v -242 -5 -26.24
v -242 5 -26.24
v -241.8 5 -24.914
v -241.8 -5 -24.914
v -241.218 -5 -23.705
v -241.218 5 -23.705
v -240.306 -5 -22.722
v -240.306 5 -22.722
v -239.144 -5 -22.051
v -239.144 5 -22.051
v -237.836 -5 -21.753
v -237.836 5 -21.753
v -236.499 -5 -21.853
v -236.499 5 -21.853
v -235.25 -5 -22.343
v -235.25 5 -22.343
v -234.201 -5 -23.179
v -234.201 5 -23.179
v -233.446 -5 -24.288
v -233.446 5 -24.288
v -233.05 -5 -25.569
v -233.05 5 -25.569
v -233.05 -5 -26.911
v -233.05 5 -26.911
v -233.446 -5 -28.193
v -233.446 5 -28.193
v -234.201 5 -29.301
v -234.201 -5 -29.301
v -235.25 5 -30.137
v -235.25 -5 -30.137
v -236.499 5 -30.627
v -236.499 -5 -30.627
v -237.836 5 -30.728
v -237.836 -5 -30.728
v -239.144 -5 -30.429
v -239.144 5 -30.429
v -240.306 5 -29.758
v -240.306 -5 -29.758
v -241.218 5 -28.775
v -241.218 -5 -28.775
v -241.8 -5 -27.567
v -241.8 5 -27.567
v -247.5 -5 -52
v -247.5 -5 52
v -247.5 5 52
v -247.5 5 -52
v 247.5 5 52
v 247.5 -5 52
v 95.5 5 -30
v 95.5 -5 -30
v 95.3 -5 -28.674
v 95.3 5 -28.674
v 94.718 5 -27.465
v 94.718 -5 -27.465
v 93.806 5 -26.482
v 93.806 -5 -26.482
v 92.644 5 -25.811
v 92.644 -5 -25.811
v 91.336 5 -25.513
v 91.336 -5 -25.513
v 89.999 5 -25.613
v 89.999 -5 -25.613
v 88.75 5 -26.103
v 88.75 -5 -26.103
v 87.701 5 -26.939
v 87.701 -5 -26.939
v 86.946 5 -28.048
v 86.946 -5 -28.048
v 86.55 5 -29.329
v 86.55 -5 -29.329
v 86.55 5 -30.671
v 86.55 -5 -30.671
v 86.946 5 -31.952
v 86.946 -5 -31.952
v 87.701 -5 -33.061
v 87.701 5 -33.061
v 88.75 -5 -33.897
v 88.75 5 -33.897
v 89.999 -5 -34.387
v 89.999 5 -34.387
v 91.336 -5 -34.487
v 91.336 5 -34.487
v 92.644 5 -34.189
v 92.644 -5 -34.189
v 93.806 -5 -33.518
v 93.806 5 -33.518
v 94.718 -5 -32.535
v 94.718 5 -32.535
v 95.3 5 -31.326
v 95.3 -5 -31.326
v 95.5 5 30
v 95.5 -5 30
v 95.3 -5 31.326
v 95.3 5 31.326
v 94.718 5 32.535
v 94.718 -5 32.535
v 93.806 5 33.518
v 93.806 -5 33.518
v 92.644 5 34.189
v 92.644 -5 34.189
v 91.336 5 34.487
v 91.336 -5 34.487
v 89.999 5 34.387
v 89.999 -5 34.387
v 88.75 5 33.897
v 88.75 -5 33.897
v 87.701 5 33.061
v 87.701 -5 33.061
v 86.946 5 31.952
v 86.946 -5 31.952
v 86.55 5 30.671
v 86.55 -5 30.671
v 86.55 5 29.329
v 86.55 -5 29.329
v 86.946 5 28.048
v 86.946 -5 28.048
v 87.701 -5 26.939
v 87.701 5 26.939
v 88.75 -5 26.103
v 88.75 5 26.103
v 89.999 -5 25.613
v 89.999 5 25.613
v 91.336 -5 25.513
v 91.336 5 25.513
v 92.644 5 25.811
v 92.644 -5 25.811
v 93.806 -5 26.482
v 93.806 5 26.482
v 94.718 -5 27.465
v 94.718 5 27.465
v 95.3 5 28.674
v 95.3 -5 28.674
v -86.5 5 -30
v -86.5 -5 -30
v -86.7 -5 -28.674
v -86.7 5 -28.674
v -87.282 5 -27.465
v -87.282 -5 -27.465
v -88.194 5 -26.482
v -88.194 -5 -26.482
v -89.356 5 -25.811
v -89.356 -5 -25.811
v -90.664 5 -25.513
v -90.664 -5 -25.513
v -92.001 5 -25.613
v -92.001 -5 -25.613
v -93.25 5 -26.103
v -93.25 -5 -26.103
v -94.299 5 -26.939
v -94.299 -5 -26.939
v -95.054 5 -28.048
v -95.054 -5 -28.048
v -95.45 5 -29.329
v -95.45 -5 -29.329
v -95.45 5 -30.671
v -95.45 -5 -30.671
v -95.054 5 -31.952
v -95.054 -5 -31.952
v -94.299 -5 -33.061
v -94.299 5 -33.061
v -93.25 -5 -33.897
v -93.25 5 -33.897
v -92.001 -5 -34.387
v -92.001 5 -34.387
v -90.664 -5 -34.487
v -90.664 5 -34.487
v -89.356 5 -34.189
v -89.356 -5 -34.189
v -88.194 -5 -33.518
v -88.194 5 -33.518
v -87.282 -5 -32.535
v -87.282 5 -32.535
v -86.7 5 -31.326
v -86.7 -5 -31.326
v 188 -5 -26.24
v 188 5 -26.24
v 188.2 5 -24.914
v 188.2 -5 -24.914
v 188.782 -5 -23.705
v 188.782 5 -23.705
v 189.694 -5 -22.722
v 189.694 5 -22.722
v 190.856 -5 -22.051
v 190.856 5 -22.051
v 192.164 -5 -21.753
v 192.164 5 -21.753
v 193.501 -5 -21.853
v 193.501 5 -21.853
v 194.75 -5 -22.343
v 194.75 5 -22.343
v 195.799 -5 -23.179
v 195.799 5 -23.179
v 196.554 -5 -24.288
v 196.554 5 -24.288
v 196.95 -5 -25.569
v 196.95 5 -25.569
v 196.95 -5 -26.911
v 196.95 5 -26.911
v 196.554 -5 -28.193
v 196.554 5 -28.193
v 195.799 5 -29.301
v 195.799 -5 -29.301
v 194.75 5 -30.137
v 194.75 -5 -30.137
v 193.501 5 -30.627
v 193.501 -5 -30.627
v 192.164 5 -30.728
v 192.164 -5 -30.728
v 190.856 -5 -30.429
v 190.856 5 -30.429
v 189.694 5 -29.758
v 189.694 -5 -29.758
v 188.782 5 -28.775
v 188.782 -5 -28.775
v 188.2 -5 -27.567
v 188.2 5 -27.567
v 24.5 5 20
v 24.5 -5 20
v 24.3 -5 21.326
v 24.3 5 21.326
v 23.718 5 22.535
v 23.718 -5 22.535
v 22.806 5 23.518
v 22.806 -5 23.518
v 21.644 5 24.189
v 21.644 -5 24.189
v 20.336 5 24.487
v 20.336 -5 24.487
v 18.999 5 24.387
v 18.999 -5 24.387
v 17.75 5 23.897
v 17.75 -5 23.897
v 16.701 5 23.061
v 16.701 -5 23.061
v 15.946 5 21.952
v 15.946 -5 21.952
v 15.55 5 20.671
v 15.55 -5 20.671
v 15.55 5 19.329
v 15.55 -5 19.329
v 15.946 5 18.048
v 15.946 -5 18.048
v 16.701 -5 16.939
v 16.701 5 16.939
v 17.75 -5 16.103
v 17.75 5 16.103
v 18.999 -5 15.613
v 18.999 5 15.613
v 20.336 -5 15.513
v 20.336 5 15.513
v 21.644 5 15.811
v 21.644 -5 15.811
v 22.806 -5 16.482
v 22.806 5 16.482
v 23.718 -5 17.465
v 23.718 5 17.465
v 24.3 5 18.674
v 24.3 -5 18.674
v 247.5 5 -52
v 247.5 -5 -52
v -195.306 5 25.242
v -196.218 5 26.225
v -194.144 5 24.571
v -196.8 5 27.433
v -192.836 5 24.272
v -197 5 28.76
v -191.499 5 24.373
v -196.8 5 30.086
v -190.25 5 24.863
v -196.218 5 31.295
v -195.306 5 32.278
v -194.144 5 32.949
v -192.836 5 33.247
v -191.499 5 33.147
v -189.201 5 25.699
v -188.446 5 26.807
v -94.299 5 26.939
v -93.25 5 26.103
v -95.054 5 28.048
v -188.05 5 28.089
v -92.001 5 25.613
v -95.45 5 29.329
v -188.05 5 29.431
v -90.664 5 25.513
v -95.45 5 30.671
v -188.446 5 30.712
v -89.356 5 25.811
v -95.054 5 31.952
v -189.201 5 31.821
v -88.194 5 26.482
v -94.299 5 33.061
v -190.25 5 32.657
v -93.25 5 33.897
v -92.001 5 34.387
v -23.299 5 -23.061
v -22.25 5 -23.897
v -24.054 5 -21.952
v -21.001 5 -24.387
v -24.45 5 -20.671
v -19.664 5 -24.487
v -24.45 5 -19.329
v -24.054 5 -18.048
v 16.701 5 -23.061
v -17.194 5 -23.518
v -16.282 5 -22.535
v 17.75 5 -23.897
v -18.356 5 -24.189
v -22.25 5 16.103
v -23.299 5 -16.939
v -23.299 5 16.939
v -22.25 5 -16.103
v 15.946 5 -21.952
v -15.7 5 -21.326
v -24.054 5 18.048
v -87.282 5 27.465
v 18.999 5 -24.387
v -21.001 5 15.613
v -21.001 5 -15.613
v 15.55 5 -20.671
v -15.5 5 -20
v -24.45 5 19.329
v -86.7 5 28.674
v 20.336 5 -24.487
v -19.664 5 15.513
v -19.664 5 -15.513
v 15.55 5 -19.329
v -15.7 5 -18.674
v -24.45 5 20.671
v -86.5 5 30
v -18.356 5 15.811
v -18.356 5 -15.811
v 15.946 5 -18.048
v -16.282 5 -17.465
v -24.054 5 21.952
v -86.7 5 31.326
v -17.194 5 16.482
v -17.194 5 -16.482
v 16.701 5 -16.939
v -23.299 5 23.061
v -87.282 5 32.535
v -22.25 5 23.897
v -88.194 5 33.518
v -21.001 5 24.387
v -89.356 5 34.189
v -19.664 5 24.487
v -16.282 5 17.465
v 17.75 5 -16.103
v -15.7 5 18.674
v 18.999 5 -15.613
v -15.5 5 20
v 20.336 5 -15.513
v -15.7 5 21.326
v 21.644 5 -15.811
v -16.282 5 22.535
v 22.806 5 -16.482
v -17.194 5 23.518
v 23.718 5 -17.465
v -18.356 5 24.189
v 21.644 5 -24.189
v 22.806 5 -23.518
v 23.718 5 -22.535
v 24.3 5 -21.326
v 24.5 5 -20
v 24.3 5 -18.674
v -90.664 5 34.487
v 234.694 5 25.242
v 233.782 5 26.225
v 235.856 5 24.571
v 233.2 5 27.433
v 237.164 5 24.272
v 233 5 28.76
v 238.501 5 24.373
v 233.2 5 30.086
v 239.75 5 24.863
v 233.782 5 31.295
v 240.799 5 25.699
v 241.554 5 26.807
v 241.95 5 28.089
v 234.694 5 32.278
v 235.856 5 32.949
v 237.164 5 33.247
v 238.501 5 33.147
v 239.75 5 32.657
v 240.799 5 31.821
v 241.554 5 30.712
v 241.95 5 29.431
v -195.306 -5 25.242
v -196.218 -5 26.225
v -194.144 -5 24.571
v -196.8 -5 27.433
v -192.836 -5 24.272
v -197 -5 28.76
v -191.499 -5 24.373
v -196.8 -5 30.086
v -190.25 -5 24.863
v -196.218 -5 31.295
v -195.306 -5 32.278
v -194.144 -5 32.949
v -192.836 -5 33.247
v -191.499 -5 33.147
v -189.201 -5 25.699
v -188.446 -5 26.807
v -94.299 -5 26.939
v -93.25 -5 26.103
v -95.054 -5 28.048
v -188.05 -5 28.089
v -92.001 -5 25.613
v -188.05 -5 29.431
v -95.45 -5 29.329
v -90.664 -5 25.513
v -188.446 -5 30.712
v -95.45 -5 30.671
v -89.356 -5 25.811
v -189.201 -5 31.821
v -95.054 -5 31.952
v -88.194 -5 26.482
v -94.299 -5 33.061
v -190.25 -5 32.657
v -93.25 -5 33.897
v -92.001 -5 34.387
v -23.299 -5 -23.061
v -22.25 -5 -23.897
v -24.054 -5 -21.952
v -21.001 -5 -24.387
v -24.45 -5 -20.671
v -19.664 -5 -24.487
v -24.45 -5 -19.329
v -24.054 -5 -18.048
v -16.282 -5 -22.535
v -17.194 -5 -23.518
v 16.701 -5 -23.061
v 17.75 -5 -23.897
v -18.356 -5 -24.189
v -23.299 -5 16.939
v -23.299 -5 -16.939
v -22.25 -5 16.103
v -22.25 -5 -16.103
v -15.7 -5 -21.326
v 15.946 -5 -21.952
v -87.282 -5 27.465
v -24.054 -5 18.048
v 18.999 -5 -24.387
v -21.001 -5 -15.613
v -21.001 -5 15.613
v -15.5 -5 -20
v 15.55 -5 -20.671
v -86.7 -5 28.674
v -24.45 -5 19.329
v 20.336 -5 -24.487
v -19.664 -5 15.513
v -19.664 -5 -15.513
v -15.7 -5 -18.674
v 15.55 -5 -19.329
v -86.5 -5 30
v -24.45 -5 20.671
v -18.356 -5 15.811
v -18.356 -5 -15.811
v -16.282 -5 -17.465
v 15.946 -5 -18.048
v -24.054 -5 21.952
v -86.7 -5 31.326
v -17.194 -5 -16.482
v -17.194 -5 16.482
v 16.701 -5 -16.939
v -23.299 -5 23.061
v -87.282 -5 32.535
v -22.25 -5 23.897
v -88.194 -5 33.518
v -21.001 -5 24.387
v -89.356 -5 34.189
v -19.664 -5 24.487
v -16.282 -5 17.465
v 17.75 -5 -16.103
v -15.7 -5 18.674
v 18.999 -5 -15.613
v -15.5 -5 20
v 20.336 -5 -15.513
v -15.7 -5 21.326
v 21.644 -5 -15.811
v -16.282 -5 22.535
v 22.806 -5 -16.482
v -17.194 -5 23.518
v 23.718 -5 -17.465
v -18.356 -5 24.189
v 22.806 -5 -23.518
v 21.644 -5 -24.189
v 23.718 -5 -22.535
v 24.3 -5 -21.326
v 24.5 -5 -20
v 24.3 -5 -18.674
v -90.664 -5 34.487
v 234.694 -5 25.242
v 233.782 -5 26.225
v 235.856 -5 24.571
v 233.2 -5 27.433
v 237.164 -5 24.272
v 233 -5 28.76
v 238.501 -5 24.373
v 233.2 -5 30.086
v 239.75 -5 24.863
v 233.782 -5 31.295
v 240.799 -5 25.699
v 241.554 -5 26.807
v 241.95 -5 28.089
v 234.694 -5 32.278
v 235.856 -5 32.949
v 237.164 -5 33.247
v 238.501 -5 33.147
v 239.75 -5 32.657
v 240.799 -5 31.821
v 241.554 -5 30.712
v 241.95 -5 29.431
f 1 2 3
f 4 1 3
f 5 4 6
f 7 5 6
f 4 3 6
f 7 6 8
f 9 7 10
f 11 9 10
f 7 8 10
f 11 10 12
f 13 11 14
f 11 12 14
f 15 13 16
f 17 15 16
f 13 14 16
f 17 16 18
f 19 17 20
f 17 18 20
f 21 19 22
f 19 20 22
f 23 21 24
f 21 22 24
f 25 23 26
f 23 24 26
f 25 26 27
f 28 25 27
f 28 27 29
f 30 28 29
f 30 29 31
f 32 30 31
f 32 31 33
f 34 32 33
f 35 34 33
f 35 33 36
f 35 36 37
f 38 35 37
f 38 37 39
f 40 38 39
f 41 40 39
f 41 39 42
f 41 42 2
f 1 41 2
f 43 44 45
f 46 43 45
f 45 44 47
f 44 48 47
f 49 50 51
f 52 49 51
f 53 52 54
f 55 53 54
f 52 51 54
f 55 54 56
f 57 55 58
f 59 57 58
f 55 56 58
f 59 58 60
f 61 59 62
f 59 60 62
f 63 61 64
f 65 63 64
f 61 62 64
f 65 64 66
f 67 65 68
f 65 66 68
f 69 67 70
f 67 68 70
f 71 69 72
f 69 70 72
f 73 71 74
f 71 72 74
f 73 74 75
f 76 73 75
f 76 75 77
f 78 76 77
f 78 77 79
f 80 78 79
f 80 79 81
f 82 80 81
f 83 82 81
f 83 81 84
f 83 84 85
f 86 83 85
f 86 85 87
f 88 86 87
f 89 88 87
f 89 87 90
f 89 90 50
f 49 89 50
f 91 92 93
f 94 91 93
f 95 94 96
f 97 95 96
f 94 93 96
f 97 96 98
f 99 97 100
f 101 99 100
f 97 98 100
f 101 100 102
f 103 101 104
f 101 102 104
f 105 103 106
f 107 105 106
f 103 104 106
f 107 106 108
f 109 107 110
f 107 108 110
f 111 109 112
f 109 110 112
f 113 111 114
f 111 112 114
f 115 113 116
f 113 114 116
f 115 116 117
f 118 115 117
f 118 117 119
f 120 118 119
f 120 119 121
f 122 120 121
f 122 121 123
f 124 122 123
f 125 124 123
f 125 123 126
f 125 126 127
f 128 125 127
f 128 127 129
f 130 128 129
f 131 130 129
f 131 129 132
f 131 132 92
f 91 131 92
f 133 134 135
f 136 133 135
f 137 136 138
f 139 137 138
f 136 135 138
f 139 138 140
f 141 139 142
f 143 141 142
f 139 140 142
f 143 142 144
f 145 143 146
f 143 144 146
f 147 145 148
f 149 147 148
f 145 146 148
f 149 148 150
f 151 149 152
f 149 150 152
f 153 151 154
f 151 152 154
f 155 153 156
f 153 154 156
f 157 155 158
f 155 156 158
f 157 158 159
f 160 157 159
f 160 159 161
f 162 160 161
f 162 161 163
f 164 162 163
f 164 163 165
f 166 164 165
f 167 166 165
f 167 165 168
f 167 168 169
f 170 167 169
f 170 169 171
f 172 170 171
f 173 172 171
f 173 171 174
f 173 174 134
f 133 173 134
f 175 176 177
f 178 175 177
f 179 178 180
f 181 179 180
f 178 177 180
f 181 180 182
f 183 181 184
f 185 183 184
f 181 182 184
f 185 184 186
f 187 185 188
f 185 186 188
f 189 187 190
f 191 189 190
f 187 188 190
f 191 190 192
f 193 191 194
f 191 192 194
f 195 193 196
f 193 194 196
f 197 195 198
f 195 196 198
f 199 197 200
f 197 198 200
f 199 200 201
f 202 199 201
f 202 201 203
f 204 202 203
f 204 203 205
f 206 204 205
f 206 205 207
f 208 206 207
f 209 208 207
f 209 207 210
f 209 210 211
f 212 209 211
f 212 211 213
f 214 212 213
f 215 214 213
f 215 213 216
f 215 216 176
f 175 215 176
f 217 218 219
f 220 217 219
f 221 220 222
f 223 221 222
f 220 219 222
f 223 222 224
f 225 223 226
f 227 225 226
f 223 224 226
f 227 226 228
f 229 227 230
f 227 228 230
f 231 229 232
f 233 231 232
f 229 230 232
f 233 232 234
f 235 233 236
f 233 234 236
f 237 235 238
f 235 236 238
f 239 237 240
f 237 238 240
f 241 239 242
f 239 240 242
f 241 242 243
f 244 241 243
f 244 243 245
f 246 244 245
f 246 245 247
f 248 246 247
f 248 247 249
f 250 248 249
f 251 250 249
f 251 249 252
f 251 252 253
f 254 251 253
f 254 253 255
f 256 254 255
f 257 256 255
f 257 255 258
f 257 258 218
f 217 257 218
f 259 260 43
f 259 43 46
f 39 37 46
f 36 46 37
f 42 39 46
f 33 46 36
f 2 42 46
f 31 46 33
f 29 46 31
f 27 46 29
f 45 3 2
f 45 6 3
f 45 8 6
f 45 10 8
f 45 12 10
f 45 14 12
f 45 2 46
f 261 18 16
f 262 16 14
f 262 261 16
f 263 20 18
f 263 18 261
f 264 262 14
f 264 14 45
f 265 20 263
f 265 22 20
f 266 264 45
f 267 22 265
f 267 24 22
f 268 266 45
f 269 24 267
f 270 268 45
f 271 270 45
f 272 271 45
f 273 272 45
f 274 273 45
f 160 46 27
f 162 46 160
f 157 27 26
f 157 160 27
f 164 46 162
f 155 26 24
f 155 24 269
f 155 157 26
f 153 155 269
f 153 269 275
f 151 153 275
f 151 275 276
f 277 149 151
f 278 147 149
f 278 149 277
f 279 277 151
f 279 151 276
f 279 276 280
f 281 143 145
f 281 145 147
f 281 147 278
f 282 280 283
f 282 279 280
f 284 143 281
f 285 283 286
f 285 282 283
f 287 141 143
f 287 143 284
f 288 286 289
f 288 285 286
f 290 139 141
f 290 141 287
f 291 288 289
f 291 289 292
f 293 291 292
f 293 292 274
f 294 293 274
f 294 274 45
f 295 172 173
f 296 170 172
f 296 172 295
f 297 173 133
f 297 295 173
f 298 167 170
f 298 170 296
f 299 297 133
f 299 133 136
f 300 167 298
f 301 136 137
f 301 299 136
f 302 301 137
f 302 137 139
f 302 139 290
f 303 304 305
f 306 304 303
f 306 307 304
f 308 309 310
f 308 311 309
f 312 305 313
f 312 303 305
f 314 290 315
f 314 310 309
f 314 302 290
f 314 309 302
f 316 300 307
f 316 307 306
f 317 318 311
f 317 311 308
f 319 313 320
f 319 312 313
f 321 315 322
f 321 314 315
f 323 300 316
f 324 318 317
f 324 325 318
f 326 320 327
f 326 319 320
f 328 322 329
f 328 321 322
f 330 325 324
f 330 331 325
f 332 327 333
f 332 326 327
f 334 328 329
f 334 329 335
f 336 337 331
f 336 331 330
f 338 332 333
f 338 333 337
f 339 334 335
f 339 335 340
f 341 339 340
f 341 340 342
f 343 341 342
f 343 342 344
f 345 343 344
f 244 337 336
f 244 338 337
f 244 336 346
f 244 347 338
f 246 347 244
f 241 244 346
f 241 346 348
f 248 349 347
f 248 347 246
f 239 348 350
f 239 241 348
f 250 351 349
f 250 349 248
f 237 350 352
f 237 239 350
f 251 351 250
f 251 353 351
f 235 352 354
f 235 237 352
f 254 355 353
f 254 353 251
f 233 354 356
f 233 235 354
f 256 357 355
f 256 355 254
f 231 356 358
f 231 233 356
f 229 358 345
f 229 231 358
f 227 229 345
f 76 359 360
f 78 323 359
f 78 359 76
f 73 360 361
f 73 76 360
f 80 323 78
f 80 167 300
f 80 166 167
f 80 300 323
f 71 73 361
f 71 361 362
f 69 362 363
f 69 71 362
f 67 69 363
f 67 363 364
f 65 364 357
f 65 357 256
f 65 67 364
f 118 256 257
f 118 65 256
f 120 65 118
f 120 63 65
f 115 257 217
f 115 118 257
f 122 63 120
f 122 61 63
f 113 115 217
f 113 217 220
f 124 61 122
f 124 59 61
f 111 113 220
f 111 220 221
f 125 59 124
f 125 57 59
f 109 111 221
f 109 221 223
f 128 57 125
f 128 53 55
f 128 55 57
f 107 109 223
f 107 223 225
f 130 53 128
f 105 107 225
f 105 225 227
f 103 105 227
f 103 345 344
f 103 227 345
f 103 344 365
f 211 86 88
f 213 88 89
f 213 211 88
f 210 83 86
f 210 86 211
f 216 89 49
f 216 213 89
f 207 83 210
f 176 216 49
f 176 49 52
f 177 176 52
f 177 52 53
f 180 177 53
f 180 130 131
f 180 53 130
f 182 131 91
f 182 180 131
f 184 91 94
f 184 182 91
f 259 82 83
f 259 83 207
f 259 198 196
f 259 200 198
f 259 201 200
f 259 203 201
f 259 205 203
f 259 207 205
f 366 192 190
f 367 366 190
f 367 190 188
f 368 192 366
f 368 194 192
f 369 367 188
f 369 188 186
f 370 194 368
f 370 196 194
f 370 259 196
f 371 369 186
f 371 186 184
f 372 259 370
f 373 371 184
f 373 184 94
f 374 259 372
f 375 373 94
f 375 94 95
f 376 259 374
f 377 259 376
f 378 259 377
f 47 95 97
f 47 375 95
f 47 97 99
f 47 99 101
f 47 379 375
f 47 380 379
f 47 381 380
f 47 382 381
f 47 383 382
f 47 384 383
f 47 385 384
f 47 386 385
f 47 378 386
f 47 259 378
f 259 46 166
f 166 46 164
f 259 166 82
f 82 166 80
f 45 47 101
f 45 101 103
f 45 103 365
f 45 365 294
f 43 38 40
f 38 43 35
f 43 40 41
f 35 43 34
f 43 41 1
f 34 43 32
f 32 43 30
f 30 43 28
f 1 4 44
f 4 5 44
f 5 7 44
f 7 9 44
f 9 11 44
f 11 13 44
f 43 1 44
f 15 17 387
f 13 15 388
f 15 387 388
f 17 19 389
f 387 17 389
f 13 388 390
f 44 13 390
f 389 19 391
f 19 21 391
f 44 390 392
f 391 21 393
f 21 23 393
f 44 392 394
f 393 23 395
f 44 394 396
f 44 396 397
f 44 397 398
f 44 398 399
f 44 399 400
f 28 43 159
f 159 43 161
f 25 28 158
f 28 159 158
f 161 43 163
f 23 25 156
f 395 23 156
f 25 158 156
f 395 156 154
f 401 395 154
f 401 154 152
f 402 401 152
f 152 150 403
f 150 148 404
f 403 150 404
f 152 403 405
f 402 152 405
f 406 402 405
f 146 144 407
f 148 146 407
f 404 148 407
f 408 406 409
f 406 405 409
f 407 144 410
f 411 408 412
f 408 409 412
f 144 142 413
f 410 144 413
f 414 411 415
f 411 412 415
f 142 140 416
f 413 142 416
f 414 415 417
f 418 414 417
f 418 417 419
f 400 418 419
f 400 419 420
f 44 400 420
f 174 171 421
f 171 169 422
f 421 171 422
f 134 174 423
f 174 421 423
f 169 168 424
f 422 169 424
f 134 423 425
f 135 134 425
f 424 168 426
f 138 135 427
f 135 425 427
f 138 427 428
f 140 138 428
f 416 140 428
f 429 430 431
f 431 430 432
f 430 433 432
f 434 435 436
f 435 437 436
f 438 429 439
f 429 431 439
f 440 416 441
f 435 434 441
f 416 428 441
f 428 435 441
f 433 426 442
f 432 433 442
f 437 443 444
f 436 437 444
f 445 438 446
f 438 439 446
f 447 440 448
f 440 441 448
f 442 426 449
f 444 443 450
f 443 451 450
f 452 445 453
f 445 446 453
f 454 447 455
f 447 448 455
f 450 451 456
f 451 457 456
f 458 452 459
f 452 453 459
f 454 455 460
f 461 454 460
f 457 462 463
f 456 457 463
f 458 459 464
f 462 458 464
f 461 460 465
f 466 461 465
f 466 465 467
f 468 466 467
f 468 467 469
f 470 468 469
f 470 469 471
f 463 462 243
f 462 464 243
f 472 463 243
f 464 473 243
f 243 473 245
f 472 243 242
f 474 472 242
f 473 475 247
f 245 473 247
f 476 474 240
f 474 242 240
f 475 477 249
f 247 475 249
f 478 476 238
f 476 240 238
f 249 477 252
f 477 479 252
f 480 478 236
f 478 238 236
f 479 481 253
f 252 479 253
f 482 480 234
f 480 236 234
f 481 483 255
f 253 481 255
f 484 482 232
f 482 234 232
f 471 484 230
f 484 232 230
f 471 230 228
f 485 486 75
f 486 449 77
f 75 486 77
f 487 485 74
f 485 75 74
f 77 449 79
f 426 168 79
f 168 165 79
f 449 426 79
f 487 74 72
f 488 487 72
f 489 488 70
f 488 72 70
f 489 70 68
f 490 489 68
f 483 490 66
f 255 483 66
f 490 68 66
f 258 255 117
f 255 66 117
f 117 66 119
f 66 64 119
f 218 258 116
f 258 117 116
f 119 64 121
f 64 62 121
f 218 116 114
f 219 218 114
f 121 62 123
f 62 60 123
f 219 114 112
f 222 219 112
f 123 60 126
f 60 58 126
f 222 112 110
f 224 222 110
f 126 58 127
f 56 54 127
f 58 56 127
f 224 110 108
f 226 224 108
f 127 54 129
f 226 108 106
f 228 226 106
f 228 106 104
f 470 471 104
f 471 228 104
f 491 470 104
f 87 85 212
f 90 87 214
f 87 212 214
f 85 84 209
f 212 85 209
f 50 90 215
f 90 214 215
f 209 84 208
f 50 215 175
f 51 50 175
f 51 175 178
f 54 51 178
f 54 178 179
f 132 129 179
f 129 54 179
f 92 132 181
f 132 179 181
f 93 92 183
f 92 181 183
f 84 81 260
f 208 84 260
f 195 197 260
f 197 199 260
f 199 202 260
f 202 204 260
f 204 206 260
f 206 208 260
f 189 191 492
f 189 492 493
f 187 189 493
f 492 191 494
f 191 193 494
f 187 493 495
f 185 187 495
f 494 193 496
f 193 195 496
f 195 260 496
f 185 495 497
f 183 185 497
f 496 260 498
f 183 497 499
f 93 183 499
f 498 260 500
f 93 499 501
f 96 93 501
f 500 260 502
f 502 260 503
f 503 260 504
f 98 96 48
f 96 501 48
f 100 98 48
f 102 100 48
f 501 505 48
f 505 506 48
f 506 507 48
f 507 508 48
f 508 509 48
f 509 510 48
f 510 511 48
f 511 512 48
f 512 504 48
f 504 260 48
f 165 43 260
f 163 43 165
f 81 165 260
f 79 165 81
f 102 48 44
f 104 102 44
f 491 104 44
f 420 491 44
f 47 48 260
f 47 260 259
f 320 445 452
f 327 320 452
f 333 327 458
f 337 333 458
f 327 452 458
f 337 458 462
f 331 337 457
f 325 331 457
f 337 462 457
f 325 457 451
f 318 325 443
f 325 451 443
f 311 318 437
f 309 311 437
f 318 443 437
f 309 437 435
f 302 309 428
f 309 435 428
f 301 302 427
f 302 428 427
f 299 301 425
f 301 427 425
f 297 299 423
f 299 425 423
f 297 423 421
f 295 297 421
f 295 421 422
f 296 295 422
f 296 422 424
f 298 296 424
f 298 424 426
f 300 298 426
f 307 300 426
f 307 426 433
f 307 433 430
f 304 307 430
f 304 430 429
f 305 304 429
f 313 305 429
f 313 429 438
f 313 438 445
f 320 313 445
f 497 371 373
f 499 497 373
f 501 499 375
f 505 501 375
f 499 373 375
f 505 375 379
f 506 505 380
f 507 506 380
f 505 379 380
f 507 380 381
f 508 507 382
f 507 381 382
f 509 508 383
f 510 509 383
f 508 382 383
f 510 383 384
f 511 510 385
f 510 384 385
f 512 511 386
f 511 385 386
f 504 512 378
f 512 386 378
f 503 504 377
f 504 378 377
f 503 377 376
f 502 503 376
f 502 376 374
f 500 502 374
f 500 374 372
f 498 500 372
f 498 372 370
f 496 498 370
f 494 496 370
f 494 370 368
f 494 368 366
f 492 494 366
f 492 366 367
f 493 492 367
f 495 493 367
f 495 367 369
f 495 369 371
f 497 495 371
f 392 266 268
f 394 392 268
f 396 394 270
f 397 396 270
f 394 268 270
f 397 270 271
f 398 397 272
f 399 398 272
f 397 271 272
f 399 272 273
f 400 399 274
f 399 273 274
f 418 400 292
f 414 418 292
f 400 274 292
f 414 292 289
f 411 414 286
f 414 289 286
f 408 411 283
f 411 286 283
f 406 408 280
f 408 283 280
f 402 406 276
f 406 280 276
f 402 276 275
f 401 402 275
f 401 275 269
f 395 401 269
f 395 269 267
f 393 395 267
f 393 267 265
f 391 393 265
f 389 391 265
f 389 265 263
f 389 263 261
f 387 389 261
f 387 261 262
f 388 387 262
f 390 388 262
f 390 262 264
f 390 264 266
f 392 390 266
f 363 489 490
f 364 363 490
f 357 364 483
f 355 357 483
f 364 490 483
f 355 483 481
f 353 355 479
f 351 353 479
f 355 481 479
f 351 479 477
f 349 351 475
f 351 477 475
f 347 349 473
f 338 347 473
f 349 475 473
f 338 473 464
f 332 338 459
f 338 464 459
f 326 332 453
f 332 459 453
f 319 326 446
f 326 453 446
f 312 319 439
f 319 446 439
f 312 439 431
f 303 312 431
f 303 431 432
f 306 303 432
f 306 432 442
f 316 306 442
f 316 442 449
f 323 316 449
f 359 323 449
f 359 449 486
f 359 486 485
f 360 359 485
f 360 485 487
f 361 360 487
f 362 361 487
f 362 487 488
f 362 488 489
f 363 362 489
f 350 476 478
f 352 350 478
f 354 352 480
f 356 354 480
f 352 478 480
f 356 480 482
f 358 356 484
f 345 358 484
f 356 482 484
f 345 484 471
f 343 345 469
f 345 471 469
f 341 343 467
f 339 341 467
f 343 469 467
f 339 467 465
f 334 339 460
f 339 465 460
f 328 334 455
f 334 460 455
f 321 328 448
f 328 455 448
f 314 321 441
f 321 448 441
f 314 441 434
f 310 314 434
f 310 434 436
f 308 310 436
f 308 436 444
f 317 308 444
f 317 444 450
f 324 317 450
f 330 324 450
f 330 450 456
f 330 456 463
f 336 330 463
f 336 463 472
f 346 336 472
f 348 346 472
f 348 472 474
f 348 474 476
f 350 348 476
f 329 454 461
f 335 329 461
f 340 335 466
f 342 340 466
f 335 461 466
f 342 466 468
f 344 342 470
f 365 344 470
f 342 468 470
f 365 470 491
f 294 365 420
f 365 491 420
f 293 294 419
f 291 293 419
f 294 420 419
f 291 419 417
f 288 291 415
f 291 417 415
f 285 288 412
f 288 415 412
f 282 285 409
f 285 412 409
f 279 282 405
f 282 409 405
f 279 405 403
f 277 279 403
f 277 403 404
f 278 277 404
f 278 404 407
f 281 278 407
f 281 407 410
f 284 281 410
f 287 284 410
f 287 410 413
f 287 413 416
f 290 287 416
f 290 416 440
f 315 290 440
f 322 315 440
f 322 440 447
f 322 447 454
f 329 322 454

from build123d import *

# Parameters (mm, degrees)
F0_W     = 10
F0_H     = 104
F1_DEPTH = 247.5
F3_D     = 9
F3_DEPTH = 18
F3_TIP   = 2.7038727856
F5_D     = 9
F5_DEPTH = 18
F5_TIP   = 2.7038727856


with BuildPart() as f1:
    # F0 (on Right) → F1 (new body, symmetric)
    with BuildSketch(Plane.YZ):
        Rectangle(F0_W, F0_H)
    extrude(amount=F1_DEPTH, both=True)

    # F3
    with Locations(Plane.XZ.offset(5)):
        with Locations((-192.5, 28.7598677054), (-237.5, -26.2401322946), (237.5, 28.7598677054), (192.5, -26.2401322946)):
            Hole(F3_D / 2, depth=F3_DEPTH)
            with Locations((0, 0, -(F3_DEPTH + F3_TIP / 2))):  # 118° drill point
                Cone(0, F3_D / 2, F3_TIP, mode=Mode.SUBTRACT)

    # F5
    with Locations(Plane(origin=(0, 5, 0), x_dir=(-1, 0, 0), z_dir=(0, 1, 0))):
        with Locations((-20, 20), (20, 20), (-20, -20), (20, -20), (91, 30), (91, -30), (-91, -30), (-91, 30)):
            Hole(F5_D / 2, depth=F5_DEPTH)
            with Locations((0, 0, -(F5_DEPTH + F5_TIP / 2))):  # 118° drill point
                Cone(0, F5_D / 2, F5_TIP, mode=Mode.SUBTRACT)


solid = f1.part
